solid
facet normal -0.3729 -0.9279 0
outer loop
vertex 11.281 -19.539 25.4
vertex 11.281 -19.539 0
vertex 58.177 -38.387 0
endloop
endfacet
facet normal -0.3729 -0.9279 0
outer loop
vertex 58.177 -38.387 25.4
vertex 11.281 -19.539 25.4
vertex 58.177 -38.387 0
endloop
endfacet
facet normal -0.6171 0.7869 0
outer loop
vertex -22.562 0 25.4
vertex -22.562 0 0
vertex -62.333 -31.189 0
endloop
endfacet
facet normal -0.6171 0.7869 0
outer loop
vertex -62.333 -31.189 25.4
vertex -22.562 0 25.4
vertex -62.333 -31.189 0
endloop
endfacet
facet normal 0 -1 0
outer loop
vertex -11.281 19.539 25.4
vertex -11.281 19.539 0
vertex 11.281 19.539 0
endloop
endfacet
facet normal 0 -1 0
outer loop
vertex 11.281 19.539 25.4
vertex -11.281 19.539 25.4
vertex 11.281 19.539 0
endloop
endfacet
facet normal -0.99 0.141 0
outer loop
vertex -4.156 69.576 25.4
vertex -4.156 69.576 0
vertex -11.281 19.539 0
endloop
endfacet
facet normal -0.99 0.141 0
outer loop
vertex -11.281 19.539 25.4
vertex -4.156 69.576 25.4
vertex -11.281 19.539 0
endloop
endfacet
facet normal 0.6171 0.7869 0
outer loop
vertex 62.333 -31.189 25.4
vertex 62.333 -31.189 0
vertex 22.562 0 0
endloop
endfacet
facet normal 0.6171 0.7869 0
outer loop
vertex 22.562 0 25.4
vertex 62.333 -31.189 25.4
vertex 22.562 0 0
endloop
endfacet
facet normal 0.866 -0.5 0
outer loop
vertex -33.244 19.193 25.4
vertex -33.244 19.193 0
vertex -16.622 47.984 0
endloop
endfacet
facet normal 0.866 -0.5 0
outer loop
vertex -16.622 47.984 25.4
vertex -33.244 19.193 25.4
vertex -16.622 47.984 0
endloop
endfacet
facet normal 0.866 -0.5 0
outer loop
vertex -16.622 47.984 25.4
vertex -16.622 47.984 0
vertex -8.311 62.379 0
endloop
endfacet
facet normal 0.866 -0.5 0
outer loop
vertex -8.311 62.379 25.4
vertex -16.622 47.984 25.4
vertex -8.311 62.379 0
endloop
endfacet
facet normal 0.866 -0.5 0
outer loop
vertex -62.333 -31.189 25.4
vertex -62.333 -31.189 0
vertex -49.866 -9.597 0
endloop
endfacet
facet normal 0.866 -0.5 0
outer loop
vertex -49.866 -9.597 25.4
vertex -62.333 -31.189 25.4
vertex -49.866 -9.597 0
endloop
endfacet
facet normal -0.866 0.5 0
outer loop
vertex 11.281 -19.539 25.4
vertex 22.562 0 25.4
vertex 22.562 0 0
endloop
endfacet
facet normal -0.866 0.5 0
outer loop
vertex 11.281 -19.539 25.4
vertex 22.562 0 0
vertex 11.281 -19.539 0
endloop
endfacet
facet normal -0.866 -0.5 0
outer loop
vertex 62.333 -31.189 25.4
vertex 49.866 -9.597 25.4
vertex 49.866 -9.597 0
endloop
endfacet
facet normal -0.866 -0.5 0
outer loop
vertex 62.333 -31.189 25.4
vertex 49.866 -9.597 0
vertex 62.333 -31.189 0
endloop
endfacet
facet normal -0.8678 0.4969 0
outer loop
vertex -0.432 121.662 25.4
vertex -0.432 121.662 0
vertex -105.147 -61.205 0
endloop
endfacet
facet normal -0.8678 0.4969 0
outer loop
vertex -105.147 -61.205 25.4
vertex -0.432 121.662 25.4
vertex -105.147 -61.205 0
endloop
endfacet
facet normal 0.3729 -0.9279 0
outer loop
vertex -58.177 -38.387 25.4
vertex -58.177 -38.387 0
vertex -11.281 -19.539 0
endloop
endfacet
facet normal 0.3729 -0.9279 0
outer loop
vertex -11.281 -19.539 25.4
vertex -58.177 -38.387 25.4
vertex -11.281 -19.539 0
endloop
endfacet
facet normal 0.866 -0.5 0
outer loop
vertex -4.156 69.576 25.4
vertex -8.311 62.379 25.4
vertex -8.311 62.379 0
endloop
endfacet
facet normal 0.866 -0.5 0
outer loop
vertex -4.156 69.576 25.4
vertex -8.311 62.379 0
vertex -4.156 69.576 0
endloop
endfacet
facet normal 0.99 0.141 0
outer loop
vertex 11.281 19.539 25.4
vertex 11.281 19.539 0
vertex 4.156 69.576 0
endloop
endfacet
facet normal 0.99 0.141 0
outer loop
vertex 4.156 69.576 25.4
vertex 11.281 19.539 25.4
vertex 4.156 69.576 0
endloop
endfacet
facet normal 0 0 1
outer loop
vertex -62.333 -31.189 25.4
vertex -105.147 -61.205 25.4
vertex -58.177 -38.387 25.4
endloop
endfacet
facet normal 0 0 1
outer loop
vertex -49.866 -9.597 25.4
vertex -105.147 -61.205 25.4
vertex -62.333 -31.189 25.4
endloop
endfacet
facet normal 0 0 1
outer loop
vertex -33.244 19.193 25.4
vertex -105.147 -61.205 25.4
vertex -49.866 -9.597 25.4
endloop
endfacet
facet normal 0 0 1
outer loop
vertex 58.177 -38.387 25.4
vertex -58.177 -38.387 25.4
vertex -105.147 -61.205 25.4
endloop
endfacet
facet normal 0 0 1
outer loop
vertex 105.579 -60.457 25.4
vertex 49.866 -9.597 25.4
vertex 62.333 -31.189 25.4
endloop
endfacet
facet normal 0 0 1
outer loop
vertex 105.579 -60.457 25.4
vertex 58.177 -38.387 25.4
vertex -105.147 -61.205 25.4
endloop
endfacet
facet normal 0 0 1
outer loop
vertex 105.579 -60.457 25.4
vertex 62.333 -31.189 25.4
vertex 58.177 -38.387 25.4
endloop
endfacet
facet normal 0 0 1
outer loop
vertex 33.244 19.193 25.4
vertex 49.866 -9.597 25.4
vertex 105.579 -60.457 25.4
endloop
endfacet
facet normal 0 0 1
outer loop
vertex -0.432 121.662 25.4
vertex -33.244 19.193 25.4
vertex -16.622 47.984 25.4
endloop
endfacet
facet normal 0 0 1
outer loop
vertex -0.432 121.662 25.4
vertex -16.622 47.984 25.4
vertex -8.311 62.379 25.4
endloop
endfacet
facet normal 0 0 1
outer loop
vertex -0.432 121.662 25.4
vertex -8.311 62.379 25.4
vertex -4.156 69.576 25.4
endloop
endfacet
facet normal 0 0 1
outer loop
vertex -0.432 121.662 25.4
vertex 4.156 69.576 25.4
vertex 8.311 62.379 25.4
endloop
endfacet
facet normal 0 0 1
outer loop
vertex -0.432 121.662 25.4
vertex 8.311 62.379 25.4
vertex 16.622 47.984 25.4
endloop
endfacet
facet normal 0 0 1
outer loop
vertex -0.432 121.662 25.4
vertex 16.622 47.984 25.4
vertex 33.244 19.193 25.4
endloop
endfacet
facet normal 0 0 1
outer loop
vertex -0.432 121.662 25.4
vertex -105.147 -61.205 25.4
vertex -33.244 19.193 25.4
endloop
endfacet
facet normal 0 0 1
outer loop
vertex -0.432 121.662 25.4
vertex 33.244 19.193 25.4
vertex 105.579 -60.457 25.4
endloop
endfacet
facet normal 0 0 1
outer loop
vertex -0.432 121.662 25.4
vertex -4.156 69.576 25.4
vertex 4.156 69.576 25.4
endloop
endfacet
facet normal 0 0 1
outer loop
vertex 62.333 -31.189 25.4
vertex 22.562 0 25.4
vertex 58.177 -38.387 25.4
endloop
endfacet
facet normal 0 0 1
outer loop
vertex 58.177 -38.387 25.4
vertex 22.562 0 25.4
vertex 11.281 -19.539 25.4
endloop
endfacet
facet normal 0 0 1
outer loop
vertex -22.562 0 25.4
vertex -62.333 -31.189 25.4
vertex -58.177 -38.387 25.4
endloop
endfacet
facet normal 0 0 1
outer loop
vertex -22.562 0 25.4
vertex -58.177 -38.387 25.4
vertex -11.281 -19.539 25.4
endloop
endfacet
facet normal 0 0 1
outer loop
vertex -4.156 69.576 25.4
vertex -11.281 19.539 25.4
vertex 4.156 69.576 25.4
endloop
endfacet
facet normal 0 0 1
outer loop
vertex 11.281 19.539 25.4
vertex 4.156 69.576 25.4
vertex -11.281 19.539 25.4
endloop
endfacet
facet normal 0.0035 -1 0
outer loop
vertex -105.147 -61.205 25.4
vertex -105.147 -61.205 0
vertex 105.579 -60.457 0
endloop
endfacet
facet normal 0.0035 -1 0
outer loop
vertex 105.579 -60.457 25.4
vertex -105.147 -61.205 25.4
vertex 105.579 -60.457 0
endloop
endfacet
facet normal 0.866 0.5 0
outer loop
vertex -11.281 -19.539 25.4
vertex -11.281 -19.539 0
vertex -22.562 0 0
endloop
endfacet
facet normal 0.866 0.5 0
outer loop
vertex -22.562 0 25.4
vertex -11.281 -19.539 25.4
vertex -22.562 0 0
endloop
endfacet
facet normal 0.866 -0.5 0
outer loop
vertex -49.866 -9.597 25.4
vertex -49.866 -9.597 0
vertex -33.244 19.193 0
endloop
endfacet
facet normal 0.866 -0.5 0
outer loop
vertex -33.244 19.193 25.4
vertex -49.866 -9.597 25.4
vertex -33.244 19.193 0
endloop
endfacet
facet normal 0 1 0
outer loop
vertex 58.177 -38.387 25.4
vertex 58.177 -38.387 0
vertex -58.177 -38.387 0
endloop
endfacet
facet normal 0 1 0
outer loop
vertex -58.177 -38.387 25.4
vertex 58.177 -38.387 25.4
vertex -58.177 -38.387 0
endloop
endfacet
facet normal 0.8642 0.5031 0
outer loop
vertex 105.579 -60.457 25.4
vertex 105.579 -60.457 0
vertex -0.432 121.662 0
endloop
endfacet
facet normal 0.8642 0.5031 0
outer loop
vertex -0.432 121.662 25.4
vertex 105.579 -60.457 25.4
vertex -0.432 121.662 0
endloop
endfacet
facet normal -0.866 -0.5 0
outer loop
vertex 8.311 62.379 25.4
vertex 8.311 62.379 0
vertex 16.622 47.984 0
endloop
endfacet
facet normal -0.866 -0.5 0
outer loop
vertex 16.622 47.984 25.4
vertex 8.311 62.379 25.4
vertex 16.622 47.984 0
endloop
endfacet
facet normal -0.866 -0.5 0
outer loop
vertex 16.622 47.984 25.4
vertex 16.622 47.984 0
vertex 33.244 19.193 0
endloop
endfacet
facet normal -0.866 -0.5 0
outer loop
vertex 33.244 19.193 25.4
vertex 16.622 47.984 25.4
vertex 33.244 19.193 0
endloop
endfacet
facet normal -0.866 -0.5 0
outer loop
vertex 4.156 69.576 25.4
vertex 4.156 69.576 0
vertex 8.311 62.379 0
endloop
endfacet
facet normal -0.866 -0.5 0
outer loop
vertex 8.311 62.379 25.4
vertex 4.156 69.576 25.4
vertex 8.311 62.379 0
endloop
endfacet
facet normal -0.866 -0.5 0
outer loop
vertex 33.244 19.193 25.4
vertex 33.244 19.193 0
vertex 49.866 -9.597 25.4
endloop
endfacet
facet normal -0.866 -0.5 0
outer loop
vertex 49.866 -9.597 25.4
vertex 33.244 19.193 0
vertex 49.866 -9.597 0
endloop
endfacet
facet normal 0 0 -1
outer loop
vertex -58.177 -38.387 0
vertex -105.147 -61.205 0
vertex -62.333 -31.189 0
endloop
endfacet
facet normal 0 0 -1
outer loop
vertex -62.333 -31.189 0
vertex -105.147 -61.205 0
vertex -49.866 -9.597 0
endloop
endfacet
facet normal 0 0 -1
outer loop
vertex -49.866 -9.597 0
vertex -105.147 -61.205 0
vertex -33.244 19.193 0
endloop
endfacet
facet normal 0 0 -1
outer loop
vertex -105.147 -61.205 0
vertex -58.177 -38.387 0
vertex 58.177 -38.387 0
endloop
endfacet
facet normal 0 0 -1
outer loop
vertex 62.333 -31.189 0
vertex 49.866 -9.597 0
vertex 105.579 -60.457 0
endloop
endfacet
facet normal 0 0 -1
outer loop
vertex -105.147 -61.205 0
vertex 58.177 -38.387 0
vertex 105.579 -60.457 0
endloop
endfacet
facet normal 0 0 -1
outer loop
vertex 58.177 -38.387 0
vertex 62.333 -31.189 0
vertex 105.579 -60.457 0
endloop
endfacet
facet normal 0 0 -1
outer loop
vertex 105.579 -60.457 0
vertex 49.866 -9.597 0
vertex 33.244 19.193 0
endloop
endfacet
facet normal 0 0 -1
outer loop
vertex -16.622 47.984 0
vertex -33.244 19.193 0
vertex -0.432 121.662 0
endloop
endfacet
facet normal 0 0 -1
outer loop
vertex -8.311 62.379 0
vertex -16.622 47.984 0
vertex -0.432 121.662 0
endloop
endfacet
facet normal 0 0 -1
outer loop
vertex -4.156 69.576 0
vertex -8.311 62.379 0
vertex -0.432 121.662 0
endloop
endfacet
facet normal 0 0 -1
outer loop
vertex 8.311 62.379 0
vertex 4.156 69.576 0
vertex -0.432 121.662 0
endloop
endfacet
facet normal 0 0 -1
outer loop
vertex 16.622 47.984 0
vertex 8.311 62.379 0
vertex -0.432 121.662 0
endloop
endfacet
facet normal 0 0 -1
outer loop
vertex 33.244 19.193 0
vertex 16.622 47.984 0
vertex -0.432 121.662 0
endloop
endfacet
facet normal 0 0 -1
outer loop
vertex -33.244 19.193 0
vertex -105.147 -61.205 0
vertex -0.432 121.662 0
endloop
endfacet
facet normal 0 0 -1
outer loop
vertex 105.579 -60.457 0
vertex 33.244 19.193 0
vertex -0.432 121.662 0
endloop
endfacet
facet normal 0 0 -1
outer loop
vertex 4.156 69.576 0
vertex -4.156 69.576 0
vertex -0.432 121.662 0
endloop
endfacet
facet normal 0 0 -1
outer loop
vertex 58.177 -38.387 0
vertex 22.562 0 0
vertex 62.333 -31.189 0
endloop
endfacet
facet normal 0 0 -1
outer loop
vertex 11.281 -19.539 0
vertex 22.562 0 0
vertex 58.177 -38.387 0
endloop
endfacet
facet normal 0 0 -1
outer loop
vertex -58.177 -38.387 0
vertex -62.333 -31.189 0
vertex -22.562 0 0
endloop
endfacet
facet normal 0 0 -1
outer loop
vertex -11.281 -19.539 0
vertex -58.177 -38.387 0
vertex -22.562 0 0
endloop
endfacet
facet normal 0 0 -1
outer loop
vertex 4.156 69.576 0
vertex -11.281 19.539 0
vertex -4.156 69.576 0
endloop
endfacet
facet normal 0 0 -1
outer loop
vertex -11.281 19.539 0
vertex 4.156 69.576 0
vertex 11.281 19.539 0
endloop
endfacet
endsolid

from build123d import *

# Parameters (mm, degrees)
F1_DEPTH = 25.4


with BuildPart() as f1:
    # F0 (on Top) → F1 (new body)
    with BuildSketch(Plane.XY):
        Polygon((-105.146734, -61.205373), (105.578775, -60.457056), (-0.432041, 121.66243), align=None)
        Polygon((62.332636, -31.189396), (66.488145, -38.386948), (58.177127, -38.386948), (49.866109, -38.386948), (33.244072, -38.386948), (0, -38.386948), (-33.244072, -38.386948), (-49.866109, -38.386948), (-58.177127, -38.386948), (-66.488145, -38.386948), (-62.332636, -31.189396), (-58.177127, -23.991843), (-49.866109, -9.596737), (-33.244072, 19.193474), (-16.622036, 47.983686), (-8.311018, 62.378791), (-4.155509, 69.576344), (0, 76.773897), (4.155509, 69.576344), (8.311018, 62.378791), (16.622036, 47.983686), (33.244072, 19.193474), (49.866109, -9.596737), (58.177127, -23.991843), align=None, mode=Mode.SUBTRACT)
        Polygon((-58.177127, -38.386948), (-11.280757, -19.538844), (-22.561514, 0), (-62.332636, -31.189396), (-66.488145, -38.386948), align=None)
        Polygon((0, 19.538844), (11.280757, 19.538844), (4.155509, 69.576344), (0, 76.773897), (-4.155509, 69.576344), (-11.280757, 19.538844), align=None)
        Polygon((58.177127, -38.386948), (66.488145, -38.386948), (62.332636, -31.189396), (22.561514, 0), (11.280757, -19.538844), align=None)
    extrude(amount=F1_DEPTH)


solid = f1.part
